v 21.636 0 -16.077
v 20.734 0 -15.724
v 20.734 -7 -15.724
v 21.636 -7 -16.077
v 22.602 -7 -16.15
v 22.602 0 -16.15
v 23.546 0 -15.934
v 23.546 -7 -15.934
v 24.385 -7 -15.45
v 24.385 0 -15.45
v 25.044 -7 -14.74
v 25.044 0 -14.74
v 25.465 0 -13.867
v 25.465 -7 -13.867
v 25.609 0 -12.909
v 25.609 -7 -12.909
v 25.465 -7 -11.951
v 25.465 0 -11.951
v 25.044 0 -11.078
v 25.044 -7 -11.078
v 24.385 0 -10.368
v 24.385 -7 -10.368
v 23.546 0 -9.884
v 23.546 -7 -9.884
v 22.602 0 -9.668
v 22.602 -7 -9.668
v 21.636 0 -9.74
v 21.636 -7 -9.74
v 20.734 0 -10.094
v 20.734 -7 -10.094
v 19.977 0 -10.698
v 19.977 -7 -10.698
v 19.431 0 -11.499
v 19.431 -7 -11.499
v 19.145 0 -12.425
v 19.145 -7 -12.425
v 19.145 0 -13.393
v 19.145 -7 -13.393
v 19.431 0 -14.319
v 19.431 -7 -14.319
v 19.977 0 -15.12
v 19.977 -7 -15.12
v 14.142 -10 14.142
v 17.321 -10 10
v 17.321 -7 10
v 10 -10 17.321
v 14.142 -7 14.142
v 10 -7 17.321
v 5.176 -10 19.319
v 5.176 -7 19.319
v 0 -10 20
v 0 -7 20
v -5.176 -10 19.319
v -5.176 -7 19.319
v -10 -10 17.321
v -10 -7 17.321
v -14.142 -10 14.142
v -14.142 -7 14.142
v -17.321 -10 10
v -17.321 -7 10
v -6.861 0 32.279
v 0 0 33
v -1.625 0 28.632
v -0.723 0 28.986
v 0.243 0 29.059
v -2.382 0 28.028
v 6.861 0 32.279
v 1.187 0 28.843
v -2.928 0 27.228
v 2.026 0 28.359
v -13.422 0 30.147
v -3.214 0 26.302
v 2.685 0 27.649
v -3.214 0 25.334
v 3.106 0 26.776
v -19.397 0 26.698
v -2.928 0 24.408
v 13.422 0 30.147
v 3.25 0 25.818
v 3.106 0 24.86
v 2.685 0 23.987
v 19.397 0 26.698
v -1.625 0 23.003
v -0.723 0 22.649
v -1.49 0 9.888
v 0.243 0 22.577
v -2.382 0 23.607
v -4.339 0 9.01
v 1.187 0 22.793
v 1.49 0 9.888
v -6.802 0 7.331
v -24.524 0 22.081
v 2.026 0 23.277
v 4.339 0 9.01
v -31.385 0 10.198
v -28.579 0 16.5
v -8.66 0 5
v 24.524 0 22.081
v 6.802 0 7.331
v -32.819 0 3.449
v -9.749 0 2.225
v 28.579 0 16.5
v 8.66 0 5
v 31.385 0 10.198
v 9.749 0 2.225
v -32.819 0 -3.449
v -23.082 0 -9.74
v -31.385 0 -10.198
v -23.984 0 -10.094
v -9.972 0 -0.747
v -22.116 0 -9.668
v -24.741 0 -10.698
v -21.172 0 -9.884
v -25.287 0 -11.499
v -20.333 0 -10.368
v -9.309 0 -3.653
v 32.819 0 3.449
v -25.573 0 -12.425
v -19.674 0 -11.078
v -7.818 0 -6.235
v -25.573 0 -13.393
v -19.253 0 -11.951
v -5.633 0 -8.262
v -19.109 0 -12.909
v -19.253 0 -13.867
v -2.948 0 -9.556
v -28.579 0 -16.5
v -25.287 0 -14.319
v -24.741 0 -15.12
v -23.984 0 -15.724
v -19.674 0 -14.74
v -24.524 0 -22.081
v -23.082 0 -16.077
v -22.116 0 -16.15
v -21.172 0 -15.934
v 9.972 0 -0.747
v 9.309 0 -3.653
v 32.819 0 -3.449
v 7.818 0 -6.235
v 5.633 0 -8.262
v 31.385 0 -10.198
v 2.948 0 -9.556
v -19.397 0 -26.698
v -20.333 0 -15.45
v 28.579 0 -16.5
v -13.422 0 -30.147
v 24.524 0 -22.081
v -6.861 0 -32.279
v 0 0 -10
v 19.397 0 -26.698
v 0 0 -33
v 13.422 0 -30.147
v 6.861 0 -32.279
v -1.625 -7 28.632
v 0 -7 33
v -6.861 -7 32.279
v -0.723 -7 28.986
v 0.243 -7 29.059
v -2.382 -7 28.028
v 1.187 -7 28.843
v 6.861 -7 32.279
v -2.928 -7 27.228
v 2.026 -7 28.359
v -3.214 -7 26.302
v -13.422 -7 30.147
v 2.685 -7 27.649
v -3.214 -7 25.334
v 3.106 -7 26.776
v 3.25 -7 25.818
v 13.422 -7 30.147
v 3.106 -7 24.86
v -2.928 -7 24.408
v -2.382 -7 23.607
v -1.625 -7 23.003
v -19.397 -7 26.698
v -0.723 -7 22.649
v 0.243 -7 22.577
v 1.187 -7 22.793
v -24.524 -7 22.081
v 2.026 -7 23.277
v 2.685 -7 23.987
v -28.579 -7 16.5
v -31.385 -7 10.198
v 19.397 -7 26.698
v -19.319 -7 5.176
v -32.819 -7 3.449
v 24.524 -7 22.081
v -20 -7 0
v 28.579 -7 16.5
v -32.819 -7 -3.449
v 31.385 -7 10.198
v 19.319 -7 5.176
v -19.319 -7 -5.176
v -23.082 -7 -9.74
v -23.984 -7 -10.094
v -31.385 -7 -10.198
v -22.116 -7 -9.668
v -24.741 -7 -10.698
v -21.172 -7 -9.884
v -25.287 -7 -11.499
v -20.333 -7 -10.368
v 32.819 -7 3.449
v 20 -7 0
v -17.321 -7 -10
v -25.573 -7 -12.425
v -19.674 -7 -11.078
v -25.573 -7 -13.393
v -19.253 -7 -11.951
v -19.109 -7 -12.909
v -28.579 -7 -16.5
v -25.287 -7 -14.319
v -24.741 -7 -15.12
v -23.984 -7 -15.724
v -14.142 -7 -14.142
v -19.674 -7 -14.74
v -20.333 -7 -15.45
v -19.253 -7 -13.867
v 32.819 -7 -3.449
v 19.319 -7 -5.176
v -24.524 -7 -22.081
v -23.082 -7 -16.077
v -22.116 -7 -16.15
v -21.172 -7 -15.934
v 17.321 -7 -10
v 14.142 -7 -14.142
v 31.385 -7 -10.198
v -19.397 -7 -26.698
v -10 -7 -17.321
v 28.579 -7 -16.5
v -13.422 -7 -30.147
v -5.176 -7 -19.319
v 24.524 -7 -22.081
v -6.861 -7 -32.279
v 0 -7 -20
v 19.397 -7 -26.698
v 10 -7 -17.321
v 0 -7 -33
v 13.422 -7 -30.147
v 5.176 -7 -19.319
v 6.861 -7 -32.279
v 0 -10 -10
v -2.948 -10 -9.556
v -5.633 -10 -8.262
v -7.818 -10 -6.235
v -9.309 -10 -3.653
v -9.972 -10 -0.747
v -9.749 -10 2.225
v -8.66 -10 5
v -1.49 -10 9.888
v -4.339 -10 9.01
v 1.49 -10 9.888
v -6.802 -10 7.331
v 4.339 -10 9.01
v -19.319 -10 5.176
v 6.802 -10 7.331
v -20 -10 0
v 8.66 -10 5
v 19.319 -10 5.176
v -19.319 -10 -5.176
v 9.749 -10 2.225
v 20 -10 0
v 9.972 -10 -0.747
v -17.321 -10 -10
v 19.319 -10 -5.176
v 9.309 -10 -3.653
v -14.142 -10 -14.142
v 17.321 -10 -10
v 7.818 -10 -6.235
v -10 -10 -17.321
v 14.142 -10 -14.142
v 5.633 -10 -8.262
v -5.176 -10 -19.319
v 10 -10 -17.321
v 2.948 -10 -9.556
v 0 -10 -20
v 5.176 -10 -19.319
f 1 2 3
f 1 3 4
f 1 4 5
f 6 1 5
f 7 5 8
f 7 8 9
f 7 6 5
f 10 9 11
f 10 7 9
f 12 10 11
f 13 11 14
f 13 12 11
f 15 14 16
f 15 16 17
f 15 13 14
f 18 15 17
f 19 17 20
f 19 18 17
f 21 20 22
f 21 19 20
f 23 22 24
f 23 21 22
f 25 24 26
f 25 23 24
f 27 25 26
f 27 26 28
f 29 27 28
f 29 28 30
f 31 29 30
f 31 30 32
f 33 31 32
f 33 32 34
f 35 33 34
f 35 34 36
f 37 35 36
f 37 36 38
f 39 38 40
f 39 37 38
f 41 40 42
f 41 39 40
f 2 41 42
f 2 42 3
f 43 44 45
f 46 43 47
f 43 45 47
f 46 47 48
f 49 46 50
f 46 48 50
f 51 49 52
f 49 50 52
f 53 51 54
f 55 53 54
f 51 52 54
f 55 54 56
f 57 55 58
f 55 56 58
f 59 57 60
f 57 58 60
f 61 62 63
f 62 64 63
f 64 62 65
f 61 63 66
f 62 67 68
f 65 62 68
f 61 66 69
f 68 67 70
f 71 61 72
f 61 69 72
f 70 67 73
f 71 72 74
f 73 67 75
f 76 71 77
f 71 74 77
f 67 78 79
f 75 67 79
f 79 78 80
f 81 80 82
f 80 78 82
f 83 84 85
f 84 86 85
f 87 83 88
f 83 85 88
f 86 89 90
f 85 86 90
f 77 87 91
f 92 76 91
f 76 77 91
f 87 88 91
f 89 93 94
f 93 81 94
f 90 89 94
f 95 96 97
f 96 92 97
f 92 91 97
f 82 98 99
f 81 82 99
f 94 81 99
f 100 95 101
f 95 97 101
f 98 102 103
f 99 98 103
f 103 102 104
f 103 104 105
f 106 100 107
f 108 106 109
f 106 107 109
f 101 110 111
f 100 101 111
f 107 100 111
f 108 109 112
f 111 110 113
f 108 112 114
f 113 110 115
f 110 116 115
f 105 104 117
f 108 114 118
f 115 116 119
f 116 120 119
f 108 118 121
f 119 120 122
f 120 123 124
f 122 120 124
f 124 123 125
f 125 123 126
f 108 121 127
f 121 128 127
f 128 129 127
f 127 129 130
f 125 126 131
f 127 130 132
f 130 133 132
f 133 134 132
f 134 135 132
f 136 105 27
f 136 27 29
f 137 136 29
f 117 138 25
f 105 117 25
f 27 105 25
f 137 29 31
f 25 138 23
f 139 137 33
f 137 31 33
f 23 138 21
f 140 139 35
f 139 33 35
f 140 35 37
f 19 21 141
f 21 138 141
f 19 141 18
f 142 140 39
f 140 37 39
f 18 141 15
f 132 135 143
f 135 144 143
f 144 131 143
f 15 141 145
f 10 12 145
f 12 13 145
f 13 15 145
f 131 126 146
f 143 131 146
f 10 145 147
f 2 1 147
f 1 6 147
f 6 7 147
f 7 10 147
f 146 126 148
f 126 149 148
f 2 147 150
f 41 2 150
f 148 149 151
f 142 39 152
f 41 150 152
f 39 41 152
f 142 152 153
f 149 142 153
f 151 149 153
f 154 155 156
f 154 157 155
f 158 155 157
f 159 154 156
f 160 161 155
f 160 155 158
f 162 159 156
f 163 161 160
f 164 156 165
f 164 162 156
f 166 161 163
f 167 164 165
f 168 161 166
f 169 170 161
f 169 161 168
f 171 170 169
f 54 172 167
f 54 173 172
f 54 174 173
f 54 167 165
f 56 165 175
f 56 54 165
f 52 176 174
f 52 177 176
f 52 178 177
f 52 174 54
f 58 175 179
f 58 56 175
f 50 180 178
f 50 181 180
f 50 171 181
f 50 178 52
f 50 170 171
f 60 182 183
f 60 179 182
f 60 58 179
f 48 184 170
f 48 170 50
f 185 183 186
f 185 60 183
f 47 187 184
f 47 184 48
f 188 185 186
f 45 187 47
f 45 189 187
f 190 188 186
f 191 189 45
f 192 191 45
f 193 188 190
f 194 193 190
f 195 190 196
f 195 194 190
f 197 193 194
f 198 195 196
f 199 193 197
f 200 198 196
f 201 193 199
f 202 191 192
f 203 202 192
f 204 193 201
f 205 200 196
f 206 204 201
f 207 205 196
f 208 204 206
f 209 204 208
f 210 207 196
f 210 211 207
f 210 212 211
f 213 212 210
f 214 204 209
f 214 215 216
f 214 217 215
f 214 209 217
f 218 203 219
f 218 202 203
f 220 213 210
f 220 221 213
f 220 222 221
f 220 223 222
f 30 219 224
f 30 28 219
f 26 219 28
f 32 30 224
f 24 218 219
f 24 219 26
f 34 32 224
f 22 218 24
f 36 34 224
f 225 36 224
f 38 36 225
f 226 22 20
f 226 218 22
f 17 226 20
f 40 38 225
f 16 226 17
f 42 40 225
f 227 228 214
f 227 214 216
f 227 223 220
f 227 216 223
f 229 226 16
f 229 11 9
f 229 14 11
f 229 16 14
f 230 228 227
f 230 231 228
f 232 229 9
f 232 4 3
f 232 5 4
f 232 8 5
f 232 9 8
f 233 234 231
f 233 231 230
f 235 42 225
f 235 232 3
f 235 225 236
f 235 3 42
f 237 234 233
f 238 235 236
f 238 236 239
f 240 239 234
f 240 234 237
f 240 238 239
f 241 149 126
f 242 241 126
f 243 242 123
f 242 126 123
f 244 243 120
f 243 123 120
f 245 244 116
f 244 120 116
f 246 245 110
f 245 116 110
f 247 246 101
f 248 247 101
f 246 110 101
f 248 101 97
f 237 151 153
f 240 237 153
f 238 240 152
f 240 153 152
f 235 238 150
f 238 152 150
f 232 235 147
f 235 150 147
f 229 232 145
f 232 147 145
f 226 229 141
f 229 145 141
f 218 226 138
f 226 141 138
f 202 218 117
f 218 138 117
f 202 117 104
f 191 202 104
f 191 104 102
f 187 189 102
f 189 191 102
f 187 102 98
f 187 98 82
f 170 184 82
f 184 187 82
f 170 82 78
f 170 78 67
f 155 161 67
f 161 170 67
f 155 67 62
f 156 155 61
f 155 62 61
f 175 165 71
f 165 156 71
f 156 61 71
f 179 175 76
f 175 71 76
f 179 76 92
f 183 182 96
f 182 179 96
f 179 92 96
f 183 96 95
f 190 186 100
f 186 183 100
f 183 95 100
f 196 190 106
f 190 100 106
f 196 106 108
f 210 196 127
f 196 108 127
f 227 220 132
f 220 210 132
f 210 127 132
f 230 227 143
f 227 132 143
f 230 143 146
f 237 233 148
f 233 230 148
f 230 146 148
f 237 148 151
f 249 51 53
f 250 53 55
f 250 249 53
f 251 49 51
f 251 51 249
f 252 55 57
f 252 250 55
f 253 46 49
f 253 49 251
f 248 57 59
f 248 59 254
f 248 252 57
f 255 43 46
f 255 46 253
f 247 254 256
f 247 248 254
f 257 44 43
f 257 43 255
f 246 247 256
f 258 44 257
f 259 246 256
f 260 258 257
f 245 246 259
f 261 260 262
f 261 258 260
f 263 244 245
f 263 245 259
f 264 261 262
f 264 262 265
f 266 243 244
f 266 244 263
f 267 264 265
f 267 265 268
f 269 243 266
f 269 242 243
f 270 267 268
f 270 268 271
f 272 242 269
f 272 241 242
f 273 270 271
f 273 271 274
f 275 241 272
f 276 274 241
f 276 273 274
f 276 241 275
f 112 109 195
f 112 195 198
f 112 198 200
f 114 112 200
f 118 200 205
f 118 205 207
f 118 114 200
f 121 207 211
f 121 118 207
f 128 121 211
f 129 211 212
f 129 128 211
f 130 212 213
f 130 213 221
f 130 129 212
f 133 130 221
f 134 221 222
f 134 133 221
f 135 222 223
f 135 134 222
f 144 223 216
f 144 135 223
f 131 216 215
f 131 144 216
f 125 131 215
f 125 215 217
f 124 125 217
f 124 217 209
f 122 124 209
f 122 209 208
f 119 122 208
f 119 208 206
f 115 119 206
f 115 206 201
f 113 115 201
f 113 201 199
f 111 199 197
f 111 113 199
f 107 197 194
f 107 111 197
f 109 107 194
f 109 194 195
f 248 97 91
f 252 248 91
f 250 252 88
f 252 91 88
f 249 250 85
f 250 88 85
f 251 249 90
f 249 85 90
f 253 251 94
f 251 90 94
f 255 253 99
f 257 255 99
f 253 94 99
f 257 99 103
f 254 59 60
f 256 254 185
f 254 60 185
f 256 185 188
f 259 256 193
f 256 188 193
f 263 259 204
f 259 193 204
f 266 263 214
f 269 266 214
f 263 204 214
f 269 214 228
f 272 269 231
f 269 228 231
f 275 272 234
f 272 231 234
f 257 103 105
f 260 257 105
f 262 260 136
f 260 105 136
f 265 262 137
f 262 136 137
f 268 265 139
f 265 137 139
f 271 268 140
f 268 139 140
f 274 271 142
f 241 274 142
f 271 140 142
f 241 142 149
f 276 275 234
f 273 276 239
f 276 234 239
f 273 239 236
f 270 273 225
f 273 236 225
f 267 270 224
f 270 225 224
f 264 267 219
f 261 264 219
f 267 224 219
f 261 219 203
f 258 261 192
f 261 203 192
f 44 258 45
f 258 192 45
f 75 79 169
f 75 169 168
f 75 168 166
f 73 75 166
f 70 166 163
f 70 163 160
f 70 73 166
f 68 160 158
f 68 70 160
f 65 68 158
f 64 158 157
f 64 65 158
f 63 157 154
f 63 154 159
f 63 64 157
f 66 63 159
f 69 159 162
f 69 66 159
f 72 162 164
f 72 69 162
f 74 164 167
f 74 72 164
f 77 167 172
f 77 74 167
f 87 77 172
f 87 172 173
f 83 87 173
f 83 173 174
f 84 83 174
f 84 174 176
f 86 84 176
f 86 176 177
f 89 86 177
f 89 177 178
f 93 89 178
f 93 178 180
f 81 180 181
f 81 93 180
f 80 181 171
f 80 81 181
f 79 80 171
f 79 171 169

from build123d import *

# Parameters (mm, degrees)
F0_R     = 3.25
F1_DEPTH = 7
F2_DEPTH = 10
F3_COUNT = 3


with BuildPart() as f1:
    # F0 (on Front) → F1 (new body)
    with BuildSketch(Plane.XZ):
        with BuildLine():
            Line((17.3205080757, 10), (28.5788383249, 16.5))
            ThreePointArc((28.5788383249, 16.5), (0, 33), (-28.5788383249, 16.5))
            Line((-28.5788383249, 16.5), (-17.3205080757, 10))
            ThreePointArc((-17.3205080757, 10), (0, 20), (17.3205080757, 10))
        make_face()
        with Locations((0, 25.8179008961)):
            Circle(F0_R, mode=Mode.SUBTRACT)
    extrude(amount=F1_DEPTH)

    # F0 (on Front) → F2 (join)
    with BuildSketch(Plane.XZ):
        with BuildLine():
            Line((8.6602540378, 5), (17.3205080757, 10))
            ThreePointArc((17.3205080757, 10), (0, 20), (-17.3205080757, 10))
            Line((-17.3205080757, 10), (-8.6602540378, 5))
            ThreePointArc((-8.6602540378, 5), (0, 10), (8.6602540378, 5))
        make_face()
    extrude(amount=F2_DEPTH)

    # F3: F1 ×3 about axis
    f3_axis = Axis((0, 0, 0), (0, -1, 0))


with BuildPart() as f1_1:
    add(f1.part)
    for i in range(1, F3_COUNT):
        add(f1.part.rotate(f3_axis, i * 360 / F3_COUNT))


solid = f1_1.part
